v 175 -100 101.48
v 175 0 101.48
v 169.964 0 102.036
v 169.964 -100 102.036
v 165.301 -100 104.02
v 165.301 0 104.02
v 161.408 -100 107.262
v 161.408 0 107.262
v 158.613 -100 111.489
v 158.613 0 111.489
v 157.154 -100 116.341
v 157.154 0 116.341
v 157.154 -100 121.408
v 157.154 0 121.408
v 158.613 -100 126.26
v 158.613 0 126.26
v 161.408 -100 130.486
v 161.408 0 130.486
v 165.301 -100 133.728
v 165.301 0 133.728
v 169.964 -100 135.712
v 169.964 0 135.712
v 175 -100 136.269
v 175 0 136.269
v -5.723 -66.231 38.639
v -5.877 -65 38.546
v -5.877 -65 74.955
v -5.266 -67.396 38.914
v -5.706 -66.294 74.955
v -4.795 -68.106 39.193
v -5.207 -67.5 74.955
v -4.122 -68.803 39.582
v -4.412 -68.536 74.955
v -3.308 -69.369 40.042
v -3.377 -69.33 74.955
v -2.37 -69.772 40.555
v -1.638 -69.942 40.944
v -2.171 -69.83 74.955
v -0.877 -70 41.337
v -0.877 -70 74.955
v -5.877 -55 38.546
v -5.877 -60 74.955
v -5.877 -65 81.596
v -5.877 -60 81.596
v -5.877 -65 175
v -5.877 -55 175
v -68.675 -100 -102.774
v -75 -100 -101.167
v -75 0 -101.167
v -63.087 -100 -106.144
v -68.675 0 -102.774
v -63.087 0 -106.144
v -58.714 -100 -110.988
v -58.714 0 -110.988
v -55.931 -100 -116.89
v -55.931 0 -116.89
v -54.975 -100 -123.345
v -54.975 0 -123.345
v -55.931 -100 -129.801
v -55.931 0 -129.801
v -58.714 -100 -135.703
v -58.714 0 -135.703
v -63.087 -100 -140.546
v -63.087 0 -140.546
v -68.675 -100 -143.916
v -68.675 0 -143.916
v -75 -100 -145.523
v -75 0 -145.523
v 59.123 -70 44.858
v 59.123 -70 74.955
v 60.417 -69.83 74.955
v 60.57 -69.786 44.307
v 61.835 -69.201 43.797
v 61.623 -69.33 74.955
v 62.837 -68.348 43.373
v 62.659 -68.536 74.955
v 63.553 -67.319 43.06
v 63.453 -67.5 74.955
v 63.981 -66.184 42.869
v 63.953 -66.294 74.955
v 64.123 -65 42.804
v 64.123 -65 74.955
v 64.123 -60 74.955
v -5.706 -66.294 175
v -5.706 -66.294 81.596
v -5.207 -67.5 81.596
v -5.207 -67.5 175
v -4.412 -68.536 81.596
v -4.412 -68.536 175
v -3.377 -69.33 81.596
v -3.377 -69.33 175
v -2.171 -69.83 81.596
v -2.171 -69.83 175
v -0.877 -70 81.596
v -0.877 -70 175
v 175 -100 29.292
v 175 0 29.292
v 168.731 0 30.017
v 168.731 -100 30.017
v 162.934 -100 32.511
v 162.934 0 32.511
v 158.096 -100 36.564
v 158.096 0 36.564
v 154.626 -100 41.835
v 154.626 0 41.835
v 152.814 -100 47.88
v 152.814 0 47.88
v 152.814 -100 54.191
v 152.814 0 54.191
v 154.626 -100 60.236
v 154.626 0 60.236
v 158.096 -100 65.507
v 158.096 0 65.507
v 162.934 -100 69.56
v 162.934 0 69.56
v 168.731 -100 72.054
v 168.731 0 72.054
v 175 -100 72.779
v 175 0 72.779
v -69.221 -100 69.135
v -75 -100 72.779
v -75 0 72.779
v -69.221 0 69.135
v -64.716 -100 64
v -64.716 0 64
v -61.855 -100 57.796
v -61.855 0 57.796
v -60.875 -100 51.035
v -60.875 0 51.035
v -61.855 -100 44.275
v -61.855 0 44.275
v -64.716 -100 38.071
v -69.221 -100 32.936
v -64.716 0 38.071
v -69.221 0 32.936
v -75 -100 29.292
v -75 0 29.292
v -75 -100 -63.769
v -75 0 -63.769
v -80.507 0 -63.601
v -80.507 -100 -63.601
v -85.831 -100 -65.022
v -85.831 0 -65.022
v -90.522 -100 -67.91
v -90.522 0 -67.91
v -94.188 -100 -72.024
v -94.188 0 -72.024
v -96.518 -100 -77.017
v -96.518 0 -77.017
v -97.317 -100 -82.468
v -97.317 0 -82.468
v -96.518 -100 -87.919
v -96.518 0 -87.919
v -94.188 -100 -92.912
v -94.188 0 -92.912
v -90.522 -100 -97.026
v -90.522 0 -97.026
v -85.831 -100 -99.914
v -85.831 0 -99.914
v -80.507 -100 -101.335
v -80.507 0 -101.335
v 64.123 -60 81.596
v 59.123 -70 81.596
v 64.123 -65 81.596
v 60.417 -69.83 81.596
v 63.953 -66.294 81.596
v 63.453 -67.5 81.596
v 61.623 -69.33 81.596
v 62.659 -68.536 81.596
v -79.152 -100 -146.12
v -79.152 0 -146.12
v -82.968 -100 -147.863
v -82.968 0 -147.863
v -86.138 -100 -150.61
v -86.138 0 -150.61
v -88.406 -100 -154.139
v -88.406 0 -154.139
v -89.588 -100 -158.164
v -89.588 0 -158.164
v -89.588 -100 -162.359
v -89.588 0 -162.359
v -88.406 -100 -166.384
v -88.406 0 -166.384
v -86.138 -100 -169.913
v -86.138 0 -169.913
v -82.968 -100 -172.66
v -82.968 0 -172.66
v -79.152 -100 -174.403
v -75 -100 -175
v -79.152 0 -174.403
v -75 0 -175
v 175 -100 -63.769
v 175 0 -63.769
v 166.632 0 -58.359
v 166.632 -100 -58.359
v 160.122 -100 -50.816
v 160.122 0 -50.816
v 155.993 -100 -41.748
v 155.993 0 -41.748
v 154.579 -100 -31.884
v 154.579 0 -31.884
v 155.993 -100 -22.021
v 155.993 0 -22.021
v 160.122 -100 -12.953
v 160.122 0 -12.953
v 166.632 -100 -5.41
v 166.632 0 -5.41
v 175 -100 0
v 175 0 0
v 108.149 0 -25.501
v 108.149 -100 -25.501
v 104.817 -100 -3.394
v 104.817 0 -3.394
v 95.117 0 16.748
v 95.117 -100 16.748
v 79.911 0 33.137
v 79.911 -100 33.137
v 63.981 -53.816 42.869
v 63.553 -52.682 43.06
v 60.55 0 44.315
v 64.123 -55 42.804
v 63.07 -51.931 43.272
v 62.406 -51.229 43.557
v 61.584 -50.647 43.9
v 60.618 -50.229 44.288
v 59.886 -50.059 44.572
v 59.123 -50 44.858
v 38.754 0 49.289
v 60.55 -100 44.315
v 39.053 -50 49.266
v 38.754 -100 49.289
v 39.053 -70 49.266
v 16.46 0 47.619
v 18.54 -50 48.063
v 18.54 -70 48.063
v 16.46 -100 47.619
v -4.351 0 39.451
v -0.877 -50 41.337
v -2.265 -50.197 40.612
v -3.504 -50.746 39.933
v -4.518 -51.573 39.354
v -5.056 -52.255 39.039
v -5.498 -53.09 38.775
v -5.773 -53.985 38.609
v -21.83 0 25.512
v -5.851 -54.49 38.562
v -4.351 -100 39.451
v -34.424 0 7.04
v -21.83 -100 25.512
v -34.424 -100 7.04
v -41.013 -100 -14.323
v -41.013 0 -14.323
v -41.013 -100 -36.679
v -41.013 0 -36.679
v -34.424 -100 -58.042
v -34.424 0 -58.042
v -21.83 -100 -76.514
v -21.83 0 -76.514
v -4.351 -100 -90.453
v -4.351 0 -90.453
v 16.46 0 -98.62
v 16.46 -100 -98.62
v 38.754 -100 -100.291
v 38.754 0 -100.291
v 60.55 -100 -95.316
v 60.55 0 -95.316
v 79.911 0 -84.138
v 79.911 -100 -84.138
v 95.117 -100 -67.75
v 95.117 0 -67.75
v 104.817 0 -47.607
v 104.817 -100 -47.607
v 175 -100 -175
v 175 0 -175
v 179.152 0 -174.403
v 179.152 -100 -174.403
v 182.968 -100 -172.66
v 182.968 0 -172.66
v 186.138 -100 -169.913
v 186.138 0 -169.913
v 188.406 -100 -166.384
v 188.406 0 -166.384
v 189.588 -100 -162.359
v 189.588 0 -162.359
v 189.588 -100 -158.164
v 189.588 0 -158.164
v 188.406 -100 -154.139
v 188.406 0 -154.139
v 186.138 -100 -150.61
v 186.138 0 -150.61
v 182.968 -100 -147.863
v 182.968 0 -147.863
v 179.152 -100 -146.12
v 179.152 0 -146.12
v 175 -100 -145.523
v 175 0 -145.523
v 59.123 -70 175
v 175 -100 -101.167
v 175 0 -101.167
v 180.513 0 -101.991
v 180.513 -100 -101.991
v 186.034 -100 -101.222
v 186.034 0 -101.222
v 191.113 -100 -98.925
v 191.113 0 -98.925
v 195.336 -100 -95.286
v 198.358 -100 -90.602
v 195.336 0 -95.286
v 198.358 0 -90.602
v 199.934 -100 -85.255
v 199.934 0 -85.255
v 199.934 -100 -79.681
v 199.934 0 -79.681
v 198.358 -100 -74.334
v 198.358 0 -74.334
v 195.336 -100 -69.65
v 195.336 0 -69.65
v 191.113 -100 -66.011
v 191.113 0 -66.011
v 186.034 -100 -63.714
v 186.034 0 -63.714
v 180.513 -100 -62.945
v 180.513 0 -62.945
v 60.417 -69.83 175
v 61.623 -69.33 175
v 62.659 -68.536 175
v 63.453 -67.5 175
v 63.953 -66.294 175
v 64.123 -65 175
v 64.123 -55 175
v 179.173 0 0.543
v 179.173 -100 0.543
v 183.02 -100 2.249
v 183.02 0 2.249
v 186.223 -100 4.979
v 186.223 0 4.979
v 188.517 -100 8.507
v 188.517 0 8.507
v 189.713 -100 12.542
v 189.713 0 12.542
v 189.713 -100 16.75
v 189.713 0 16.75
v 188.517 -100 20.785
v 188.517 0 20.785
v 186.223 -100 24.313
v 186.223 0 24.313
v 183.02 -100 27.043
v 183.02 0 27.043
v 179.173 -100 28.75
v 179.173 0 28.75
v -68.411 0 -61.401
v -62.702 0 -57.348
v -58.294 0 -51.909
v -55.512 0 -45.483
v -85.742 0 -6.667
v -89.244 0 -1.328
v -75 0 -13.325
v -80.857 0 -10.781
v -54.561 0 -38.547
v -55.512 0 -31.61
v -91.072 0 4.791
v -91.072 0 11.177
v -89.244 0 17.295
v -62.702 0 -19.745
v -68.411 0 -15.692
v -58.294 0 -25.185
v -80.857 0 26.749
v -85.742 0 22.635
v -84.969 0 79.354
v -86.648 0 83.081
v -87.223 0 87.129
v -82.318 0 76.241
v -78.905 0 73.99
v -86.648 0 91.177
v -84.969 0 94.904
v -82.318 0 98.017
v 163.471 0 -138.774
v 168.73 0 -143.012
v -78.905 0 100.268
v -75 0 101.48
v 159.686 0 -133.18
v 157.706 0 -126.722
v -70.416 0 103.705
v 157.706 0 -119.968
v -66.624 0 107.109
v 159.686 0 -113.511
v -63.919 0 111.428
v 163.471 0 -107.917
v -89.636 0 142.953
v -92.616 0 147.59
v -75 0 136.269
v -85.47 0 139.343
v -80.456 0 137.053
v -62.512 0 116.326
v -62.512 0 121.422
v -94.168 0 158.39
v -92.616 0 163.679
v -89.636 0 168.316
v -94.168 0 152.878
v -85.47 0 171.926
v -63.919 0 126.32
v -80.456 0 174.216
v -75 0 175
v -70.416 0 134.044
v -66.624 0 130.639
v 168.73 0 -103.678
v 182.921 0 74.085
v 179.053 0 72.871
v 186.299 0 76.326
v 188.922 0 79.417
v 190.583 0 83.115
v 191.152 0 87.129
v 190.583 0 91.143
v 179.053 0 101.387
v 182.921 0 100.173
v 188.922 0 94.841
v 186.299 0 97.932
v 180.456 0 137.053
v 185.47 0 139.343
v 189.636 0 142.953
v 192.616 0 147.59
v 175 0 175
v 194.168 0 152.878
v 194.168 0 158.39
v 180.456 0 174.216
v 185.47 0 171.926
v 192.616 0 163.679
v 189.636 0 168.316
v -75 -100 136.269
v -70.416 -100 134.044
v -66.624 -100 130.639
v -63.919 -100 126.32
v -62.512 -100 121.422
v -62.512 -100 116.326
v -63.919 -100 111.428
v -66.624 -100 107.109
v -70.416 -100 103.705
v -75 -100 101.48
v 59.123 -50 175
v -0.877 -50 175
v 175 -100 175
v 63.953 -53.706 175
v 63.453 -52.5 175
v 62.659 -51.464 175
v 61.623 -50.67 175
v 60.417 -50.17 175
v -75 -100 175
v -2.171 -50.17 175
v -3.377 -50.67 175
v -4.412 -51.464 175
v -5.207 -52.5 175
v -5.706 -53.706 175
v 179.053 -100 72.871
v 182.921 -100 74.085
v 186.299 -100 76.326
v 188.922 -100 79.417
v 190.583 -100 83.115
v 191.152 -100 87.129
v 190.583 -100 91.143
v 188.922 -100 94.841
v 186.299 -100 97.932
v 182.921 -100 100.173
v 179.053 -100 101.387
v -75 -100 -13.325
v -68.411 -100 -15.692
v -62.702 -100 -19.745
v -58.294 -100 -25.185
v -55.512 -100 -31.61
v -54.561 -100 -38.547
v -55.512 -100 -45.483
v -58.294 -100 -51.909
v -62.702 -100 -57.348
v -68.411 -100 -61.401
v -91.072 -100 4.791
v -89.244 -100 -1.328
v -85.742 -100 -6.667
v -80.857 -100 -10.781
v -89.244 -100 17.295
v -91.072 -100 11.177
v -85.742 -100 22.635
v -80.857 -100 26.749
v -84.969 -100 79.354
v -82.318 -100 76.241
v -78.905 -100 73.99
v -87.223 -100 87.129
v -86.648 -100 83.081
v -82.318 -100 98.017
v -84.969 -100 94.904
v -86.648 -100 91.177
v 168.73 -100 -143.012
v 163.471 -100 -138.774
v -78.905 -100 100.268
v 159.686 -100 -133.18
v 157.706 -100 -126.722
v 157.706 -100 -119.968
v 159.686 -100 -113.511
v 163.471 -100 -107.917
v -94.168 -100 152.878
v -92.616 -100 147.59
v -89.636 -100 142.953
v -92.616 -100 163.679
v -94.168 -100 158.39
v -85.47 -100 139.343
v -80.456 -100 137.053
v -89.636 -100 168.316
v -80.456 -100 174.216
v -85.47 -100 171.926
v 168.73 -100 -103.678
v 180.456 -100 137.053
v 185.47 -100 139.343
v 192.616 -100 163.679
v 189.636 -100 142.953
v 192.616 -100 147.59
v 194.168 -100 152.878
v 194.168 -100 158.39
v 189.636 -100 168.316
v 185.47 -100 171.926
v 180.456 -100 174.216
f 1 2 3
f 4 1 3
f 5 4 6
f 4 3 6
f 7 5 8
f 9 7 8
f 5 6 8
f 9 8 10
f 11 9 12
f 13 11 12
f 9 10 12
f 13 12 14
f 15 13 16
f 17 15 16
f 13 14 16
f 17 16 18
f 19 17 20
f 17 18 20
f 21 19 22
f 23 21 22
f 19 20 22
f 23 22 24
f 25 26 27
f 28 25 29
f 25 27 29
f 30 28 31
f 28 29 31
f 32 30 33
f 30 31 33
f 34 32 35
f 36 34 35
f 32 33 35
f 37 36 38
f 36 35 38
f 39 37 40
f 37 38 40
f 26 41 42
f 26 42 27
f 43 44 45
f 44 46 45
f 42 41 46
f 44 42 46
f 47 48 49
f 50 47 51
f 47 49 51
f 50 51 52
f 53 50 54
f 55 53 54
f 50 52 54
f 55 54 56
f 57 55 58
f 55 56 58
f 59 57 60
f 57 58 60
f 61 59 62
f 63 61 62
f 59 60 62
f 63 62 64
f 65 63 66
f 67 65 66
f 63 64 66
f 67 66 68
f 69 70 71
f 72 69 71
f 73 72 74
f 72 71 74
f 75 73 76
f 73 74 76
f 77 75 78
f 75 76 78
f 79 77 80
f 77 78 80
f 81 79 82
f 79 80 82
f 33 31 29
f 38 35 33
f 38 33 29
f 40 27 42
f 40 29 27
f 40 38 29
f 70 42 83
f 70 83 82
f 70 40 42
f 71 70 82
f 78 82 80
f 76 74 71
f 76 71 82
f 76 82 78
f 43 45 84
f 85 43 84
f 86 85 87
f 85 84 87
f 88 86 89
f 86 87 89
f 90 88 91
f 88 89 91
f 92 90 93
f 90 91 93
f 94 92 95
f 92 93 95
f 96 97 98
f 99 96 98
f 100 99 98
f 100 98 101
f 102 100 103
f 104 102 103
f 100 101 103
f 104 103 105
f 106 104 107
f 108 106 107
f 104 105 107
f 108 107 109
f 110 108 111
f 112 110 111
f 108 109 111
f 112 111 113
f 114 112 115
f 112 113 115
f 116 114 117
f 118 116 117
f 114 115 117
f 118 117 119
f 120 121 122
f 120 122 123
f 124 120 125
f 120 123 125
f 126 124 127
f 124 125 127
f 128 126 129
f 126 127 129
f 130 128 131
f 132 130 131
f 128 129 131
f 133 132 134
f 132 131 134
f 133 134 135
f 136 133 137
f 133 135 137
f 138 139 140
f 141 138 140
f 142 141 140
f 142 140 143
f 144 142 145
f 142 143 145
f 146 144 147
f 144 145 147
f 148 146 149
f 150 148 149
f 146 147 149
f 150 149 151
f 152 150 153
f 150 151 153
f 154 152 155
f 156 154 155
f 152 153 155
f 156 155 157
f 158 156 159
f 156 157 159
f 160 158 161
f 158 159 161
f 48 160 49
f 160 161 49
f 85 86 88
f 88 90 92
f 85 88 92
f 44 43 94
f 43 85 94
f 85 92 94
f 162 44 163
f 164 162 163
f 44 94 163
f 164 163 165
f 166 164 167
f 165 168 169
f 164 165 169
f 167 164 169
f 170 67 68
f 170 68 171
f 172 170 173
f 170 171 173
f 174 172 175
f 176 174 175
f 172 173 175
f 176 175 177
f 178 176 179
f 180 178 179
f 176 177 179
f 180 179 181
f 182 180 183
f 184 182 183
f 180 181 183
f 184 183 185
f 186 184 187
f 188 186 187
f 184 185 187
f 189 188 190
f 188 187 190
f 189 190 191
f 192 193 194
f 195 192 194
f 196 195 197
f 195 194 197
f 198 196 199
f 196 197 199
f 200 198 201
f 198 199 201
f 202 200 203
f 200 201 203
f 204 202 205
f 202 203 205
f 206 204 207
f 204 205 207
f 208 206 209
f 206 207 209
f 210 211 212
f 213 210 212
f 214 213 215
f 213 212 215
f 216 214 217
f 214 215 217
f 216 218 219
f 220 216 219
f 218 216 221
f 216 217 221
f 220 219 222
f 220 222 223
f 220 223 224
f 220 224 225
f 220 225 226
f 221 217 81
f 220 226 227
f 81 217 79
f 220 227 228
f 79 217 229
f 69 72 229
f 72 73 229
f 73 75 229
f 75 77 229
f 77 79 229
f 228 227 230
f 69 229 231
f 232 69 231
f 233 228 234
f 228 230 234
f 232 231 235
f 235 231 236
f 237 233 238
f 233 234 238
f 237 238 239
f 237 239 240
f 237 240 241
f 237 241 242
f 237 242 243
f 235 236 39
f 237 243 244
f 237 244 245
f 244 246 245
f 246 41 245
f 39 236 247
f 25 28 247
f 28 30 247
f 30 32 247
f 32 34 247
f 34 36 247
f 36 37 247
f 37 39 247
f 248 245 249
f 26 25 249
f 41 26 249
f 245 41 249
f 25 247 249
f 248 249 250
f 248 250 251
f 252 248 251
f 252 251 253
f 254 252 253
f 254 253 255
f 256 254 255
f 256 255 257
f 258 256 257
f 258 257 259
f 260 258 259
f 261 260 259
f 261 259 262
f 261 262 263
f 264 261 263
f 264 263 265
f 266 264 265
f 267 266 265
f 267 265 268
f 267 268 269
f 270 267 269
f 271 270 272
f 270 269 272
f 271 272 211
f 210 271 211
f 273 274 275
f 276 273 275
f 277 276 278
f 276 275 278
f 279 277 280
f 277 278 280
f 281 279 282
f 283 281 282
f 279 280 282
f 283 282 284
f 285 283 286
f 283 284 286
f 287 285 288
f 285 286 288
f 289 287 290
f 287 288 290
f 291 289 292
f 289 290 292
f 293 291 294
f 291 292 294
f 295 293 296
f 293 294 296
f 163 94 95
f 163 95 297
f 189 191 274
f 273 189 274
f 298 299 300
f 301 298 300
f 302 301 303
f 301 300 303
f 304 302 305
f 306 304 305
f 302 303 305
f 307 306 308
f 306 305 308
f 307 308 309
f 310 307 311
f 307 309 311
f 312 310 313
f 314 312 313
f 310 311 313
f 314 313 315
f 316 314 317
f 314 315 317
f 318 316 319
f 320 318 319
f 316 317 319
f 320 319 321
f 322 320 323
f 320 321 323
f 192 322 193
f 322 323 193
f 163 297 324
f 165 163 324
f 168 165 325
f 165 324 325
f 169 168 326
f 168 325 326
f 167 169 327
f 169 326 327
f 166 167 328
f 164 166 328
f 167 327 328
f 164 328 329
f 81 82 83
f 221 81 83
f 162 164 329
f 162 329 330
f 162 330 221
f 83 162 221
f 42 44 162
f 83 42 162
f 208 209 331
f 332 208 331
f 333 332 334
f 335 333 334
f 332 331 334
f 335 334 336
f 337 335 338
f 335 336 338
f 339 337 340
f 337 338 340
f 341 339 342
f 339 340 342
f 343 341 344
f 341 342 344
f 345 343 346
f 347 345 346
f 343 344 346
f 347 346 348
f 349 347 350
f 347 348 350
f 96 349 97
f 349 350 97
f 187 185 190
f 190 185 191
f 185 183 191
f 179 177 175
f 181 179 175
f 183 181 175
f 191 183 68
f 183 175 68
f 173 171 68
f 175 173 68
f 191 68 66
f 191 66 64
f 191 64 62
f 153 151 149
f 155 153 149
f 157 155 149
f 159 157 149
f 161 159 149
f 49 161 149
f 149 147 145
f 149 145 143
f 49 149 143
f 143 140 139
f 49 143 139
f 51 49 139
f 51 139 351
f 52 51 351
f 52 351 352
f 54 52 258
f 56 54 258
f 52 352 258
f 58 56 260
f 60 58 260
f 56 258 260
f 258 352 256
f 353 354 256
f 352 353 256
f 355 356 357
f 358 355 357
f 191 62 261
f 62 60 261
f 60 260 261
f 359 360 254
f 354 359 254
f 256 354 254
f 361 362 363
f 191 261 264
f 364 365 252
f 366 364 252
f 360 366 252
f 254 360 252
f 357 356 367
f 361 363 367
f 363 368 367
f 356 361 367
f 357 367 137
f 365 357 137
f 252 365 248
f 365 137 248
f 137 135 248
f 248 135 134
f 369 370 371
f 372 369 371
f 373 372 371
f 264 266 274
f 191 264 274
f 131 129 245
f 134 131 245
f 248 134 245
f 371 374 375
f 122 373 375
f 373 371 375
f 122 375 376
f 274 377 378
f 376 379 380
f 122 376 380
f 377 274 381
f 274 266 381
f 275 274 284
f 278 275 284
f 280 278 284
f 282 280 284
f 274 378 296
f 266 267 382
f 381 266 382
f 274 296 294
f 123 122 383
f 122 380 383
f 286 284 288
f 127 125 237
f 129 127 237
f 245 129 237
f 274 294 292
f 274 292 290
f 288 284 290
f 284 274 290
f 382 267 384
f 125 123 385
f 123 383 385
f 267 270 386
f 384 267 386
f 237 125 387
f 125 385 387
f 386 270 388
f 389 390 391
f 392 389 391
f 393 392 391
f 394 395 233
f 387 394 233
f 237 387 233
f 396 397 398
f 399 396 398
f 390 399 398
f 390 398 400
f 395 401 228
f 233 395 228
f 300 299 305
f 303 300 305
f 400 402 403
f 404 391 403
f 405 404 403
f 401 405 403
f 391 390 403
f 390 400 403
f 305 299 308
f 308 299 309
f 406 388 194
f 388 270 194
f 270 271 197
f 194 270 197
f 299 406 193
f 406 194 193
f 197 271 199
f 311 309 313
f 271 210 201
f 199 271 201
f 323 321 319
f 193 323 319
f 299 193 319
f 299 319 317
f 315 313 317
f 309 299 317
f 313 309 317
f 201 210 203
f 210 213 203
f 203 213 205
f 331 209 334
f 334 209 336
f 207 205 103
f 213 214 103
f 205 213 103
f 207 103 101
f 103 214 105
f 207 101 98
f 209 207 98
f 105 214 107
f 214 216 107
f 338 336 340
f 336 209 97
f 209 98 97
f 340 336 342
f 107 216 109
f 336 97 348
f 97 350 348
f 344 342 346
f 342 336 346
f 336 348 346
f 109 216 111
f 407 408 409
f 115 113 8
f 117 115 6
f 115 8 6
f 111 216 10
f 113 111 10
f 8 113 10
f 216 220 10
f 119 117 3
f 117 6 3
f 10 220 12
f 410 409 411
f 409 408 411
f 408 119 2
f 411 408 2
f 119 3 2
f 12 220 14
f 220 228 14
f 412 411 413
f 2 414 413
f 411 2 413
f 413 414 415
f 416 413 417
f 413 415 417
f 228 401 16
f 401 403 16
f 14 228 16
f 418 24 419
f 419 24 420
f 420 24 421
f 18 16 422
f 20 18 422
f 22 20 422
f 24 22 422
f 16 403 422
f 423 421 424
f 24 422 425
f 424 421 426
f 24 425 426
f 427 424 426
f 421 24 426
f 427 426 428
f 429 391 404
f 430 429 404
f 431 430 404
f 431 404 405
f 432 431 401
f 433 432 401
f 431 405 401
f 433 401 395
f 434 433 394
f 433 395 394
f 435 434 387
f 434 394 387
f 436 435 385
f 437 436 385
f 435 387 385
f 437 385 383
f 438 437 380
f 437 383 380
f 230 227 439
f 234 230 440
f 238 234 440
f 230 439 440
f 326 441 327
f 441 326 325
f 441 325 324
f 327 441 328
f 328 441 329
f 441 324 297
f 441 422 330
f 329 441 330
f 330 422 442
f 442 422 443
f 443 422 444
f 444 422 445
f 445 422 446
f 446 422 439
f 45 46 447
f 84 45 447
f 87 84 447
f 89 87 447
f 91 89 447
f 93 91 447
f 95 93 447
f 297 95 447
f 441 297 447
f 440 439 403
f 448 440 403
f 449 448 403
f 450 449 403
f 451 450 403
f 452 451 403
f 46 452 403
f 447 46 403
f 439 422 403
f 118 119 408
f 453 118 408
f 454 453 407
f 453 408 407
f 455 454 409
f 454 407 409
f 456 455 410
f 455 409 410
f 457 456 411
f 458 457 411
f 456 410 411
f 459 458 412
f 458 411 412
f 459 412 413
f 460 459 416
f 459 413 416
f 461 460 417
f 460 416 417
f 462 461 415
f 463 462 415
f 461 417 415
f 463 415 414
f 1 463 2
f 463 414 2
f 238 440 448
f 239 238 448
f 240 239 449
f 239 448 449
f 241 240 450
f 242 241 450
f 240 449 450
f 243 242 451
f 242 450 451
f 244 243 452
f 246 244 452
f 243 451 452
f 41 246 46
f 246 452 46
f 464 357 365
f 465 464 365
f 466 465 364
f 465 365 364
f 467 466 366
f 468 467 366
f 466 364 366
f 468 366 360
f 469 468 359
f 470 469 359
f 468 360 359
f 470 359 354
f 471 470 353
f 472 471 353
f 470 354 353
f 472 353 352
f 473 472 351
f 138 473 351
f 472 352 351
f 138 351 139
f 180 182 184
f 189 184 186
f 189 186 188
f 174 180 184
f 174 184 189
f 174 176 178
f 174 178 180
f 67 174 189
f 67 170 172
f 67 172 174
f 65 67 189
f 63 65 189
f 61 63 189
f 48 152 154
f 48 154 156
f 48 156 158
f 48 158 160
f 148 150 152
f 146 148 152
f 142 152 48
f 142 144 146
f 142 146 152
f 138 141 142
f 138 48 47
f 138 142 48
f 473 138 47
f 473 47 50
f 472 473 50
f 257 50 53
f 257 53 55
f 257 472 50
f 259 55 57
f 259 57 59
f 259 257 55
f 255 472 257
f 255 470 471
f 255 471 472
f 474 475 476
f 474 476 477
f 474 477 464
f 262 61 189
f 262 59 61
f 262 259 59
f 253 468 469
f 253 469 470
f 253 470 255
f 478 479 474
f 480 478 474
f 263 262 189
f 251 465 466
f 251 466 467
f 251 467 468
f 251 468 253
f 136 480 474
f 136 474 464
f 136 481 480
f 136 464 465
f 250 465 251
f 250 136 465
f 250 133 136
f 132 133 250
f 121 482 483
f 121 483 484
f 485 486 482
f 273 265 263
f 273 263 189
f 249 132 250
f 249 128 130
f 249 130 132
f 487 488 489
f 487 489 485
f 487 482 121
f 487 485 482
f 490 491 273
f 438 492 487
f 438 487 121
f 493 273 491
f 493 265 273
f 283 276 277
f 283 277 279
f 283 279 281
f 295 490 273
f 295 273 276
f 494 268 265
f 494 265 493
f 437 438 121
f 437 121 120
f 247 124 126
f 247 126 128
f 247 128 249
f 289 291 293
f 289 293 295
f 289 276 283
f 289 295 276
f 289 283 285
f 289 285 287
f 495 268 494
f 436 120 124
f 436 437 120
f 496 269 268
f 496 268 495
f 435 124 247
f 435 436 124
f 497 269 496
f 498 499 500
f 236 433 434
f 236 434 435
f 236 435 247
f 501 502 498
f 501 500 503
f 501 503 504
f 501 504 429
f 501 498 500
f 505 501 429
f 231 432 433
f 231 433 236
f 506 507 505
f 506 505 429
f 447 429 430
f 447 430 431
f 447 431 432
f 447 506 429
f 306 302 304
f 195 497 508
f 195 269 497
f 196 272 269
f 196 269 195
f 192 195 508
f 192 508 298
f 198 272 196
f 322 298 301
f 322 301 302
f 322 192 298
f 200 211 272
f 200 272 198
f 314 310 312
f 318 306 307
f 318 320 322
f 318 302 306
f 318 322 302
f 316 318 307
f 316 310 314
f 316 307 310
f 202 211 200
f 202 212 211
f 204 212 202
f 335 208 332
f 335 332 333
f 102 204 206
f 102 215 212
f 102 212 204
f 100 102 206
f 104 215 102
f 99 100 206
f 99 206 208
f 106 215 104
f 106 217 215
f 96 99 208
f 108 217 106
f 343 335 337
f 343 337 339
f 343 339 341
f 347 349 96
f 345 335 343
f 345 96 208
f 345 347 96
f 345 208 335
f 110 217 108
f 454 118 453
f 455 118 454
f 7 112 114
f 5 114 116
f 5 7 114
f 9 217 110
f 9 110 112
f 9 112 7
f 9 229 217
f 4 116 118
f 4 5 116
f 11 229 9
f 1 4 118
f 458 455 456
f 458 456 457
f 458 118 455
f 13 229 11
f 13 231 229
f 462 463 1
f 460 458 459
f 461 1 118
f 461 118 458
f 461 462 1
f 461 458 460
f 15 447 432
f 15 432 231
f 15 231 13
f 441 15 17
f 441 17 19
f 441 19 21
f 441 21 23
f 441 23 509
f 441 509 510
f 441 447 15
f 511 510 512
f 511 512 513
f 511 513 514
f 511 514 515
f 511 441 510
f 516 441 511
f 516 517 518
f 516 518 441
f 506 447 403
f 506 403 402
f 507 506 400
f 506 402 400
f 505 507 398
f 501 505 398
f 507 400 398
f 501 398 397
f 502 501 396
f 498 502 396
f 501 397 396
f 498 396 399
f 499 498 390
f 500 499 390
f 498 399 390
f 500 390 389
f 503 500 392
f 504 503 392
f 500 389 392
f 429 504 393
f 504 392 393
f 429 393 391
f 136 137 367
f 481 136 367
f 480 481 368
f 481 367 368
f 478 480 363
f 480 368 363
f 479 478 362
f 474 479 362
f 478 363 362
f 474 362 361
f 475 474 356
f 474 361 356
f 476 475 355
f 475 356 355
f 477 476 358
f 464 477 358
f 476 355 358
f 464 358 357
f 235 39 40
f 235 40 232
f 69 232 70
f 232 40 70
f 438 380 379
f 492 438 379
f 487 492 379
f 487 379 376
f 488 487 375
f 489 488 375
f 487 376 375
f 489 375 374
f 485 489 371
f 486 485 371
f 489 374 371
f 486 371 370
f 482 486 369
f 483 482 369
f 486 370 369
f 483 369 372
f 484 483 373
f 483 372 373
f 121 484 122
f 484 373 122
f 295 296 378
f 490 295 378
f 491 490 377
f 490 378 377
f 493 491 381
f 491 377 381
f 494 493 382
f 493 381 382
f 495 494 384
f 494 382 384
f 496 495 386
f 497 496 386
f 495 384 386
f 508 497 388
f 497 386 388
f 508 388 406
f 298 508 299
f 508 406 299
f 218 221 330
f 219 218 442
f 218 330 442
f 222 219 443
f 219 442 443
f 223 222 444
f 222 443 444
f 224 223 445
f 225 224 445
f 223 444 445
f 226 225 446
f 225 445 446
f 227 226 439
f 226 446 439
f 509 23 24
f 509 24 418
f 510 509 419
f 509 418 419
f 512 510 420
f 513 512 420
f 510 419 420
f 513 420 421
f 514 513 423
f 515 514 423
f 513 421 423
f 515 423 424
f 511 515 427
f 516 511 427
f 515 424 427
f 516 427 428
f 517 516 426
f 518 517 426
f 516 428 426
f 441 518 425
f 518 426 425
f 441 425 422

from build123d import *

# Parameters (mm, degrees)
F1_DEPTH = 100
F4_DEPTH = 145
F5_W     = 129.036147
F5_H     = 6.641566
F6_DEPTH = 40
F2_R     = 75
F7_DEPTH = 319


with BuildPart() as f1:
    # F0 (on Front) → F1 (new body)
    with BuildSketch(Plane.XZ):
        with BuildLine():
            Line((175, 175), (-75, 175))
            ThreePointArc((-75, 175), (-94.36561, 155.63439), (-75, 136.26878))
            ThreePointArc((-75, 136.26878), (-62.333828, 118.8742), (-75, 101.47962))
            ThreePointArc((-75, 101.47962), (-87.223096, 87.129094), (-75, 72.778568))
            ThreePointArc((-75, 72.778568), (-60.874781, 51.035345), (-75, 29.292122))
            ThreePointArc((-75, 29.292122), (-91.304273, 7.983763), (-75, -13.324595))
            ThreePointArc((-75, -13.324595), (-54.561081, -38.546733), (-75, -63.768871))
            ThreePointArc((-75, -63.768871), (-97.317144, -82.468044), (-75, -101.167217))
            ThreePointArc((-75, -101.167217), (-54.975452, -123.345301), (-75, -145.523384))
            ThreePointArc((-75, -145.523384), (-89.738308, -160.261692), (-75, -175))
            Line((-75, -175), (175, -175))
            ThreePointArc((175, -175), (189.738308, -160.261692), (175, -145.523384))
            ThreePointArc((175, -145.523384), (157.45425, -123.345301), (175, -101.167217))
            ThreePointArc((175, -101.167217), (200.133524, -82.468044), (175, -63.768871))
            ThreePointArc((175, -63.768871), (154.578948, -31.884436), (175, 0))
            ThreePointArc((175, 0), (189.86524, 14.646061), (175, 29.292122))
            ThreePointArc((175, 29.292122), (152.58439, 51.035345), (175, 72.778568))
            ThreePointArc((175, 72.778568), (191.151996, 87.129094), (175, 101.47962))
            ThreePointArc((175, 101.47962), (156.968432, 118.8742), (175, 136.26878))
            ThreePointArc((175, 136.26878), (194.36561, 155.63439), (175, 175))
        make_face()
    extrude(amount=F1_DEPTH)

    # F3 (on face) → F4 (cut)
    with BuildSketch(Plane.XY.offset(175)):
        with BuildLine():
            Line((59.123203, -50), (-0.876797, -50))
            ThreePointArc((-0.876797, -50), (-4.412331, -51.464466), (-5.876797, -55))
            Line((-5.876797, -55), (-5.876797, -65))
            ThreePointArc((-5.876797, -65), (-4.412331, -68.535534), (-0.876797, -70))
            Line((-0.876797, -70), (59.123203, -70))
            ThreePointArc((59.123203, -70), (62.658737, -68.535534), (64.123203, -65))
            Line((64.123203, -65), (64.123203, -55))
            ThreePointArc((64.123203, -55), (62.658737, -51.464466), (59.123203, -50))
        make_face()
    extrude(amount=-F4_DEPTH, mode=Mode.SUBTRACT)

    # F5 (on face) → F6 (join)
    with BuildSketch(Plane.XZ.offset(100)):
        with Locations((5.100577, 78.275606)):
            Rectangle(F5_W, F5_H)
    extrude(amount=-F6_DEPTH)

    # F2 (on face) → F7 (cut)
    with BuildSketch(Plane.XZ.offset(100)):
        with Locations((33.149149, -25.5008)):
            Circle(F2_R)
    extrude(amount=-F7_DEPTH, mode=Mode.SUBTRACT)


solid = f1.part
